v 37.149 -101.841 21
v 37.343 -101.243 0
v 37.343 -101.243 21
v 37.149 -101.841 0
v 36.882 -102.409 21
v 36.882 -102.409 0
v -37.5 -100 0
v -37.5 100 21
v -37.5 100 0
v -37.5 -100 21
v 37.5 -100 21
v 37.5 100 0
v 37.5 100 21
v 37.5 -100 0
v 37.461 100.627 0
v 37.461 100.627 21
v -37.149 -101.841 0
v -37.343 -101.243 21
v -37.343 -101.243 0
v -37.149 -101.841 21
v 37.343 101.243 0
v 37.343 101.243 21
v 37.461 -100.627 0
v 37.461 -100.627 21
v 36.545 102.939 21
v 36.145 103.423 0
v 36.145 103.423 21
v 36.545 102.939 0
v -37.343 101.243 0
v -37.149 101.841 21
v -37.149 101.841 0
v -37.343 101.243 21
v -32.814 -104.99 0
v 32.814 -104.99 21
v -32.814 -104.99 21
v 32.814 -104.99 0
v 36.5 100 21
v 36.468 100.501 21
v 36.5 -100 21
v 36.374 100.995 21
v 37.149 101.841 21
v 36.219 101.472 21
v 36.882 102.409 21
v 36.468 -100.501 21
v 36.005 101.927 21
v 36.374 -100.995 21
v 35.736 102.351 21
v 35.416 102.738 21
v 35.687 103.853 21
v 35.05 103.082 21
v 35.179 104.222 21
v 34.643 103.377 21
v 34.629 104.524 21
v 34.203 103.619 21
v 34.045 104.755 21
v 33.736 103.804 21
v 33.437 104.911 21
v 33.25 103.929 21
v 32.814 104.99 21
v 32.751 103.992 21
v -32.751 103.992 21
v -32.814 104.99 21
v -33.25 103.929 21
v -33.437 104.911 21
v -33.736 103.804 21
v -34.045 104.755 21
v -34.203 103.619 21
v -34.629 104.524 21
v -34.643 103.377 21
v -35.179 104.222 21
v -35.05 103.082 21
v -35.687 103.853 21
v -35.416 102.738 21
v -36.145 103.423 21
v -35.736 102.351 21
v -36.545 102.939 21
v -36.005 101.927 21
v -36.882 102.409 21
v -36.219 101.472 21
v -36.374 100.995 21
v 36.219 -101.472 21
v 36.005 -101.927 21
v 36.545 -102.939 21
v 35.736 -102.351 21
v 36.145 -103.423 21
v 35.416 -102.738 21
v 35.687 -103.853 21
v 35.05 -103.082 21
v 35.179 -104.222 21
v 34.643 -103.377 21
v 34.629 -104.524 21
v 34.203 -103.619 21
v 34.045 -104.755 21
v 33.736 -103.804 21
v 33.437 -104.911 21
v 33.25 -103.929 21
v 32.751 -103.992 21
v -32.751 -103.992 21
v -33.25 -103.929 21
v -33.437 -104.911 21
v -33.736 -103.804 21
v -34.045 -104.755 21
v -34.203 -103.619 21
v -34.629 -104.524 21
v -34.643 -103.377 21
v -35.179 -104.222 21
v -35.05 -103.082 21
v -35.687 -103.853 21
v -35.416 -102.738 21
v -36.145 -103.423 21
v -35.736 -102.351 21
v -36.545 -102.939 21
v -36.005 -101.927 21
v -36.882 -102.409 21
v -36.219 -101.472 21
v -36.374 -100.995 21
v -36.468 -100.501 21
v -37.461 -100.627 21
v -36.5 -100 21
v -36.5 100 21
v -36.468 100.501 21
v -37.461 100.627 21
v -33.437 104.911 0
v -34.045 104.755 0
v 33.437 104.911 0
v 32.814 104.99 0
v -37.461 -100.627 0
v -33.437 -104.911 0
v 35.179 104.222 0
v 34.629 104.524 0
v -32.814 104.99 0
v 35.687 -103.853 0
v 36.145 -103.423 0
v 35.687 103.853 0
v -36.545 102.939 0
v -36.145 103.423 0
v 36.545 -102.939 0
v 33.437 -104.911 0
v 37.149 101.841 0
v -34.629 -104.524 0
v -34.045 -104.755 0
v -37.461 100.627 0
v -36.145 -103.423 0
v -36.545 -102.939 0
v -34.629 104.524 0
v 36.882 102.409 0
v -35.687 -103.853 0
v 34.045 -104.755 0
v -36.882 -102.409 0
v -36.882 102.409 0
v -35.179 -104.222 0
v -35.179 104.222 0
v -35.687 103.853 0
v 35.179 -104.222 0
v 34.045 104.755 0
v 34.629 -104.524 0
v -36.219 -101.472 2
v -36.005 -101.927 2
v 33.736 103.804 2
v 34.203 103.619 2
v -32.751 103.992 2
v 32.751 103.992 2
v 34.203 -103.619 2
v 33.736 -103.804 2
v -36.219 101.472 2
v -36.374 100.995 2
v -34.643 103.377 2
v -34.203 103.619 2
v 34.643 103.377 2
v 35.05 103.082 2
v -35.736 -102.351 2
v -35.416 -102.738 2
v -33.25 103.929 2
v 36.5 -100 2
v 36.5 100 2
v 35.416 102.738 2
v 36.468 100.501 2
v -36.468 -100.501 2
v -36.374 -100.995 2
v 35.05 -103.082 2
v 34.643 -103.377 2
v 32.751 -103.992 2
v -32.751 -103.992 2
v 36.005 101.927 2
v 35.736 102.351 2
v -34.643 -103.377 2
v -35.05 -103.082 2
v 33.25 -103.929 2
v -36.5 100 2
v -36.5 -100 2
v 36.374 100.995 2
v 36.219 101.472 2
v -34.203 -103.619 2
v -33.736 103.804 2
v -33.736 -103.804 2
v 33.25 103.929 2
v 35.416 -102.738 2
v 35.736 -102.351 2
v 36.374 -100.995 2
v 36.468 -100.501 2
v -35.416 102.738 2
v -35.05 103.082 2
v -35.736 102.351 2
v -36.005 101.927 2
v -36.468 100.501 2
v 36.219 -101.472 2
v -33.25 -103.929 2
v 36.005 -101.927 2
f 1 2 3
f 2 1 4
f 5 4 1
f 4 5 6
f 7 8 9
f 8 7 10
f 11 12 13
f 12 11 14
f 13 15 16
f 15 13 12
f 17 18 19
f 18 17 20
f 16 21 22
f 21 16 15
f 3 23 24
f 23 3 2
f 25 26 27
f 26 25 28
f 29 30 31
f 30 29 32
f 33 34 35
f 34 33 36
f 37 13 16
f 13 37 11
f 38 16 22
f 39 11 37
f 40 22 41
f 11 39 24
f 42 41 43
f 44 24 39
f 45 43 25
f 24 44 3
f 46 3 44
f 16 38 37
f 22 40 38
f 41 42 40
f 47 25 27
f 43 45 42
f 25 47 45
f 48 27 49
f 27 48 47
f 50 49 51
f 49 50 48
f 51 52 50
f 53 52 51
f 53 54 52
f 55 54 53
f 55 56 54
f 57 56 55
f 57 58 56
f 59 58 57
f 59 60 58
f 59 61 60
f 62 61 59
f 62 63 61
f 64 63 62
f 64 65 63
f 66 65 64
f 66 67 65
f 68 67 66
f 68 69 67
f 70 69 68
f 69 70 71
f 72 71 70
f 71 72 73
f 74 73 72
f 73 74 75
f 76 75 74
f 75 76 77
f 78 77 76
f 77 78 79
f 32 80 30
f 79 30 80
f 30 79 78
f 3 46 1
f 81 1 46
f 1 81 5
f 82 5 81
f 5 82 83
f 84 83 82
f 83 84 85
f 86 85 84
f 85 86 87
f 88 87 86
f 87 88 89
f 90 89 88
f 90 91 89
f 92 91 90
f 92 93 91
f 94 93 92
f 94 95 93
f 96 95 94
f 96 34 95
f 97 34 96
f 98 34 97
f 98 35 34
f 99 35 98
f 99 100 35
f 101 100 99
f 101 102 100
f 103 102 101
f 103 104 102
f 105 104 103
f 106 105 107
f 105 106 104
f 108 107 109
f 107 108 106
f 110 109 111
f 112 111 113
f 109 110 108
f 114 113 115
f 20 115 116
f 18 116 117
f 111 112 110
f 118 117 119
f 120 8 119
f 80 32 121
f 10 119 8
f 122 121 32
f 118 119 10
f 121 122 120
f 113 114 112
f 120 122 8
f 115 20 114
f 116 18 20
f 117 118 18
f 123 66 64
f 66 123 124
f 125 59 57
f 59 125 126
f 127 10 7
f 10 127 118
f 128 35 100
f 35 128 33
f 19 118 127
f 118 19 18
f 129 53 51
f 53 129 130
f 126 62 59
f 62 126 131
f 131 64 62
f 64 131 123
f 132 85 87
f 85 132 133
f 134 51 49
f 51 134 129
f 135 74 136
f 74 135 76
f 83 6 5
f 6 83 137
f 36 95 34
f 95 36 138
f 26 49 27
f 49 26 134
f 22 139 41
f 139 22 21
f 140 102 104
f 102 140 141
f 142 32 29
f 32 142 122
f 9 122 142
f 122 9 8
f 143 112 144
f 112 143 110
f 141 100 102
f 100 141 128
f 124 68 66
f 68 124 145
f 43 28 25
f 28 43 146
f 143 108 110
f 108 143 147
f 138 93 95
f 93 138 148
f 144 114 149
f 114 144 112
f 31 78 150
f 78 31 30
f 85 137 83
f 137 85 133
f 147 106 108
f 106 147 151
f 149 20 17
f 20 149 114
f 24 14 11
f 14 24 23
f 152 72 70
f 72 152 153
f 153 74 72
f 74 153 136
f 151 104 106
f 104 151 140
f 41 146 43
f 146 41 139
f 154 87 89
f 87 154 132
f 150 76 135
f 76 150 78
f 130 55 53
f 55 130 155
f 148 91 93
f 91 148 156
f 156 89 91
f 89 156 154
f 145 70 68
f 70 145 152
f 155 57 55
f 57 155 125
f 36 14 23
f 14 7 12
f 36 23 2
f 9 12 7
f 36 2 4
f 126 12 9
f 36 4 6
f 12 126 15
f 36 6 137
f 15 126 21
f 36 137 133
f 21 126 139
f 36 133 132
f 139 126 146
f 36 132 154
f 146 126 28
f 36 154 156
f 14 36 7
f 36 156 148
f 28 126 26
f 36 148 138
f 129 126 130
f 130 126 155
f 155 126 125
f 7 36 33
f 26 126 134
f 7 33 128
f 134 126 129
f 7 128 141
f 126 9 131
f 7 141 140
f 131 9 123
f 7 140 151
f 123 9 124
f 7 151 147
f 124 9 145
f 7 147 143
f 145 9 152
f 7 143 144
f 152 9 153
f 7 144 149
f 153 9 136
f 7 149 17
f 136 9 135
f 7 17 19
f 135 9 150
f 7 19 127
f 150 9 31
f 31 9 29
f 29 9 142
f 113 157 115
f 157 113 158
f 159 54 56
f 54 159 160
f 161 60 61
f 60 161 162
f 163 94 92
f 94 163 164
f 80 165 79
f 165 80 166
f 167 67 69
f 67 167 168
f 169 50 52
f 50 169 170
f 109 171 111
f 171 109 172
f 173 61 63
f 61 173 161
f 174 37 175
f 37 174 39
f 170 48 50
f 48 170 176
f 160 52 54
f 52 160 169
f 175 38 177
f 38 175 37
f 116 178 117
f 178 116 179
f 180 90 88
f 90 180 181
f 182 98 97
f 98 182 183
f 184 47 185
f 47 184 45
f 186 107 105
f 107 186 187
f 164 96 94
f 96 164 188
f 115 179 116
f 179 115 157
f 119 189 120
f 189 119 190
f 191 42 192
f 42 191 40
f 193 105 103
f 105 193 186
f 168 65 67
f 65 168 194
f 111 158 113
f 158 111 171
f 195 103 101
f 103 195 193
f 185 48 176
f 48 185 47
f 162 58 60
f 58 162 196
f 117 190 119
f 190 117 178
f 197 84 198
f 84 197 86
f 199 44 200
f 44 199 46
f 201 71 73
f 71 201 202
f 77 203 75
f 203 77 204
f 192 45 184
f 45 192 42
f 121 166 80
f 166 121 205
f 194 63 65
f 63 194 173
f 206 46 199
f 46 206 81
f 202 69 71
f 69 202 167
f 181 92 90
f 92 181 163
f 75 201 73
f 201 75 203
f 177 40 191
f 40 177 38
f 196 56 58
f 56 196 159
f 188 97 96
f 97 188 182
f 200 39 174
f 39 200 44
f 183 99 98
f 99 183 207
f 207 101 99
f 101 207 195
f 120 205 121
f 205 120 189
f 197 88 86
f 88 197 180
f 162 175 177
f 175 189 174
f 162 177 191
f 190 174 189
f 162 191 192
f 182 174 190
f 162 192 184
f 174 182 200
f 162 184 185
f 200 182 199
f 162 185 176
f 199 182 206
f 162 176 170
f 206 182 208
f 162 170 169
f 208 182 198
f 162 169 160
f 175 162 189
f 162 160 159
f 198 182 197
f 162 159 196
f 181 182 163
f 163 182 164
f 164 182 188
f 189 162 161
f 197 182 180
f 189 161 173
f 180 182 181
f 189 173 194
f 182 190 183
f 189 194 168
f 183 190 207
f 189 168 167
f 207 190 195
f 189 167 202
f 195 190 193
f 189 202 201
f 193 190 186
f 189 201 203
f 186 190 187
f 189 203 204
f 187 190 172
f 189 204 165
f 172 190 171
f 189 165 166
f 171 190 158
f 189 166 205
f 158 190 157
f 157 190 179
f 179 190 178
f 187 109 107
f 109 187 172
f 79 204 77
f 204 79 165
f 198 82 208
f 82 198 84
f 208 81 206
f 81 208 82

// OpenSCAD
$fn = 50;


difference() {
	union() {
		hull() {
			translate(v = [-32.5000000000, 100.0000000000, 0]) {
				cylinder(h = 21, r = 5);
			}
			translate(v = [32.5000000000, 100.0000000000, 0]) {
				cylinder(h = 21, r = 5);
			}
			translate(v = [-32.5000000000, -100.0000000000, 0]) {
				cylinder(h = 21, r = 5);
			}
			translate(v = [32.5000000000, -100.0000000000, 0]) {
				cylinder(h = 21, r = 5);
			}
		}
	}
	union() {
		translate(v = [0, 0, 2]) {
			hull() {
				translate(v = [-32.5000000000, 100.0000000000, 0]) {
					cylinder(h = 19, r = 4);
				}
				translate(v = [32.5000000000, 100.0000000000, 0]) {
					cylinder(h = 19, r = 4);
				}
				translate(v = [-32.5000000000, -100.0000000000, 0]) {
					cylinder(h = 19, r = 4);
				}
				translate(v = [32.5000000000, -100.0000000000, 0]) {
					cylinder(h = 19, r = 4);
				}
			}
		}
	}
}
